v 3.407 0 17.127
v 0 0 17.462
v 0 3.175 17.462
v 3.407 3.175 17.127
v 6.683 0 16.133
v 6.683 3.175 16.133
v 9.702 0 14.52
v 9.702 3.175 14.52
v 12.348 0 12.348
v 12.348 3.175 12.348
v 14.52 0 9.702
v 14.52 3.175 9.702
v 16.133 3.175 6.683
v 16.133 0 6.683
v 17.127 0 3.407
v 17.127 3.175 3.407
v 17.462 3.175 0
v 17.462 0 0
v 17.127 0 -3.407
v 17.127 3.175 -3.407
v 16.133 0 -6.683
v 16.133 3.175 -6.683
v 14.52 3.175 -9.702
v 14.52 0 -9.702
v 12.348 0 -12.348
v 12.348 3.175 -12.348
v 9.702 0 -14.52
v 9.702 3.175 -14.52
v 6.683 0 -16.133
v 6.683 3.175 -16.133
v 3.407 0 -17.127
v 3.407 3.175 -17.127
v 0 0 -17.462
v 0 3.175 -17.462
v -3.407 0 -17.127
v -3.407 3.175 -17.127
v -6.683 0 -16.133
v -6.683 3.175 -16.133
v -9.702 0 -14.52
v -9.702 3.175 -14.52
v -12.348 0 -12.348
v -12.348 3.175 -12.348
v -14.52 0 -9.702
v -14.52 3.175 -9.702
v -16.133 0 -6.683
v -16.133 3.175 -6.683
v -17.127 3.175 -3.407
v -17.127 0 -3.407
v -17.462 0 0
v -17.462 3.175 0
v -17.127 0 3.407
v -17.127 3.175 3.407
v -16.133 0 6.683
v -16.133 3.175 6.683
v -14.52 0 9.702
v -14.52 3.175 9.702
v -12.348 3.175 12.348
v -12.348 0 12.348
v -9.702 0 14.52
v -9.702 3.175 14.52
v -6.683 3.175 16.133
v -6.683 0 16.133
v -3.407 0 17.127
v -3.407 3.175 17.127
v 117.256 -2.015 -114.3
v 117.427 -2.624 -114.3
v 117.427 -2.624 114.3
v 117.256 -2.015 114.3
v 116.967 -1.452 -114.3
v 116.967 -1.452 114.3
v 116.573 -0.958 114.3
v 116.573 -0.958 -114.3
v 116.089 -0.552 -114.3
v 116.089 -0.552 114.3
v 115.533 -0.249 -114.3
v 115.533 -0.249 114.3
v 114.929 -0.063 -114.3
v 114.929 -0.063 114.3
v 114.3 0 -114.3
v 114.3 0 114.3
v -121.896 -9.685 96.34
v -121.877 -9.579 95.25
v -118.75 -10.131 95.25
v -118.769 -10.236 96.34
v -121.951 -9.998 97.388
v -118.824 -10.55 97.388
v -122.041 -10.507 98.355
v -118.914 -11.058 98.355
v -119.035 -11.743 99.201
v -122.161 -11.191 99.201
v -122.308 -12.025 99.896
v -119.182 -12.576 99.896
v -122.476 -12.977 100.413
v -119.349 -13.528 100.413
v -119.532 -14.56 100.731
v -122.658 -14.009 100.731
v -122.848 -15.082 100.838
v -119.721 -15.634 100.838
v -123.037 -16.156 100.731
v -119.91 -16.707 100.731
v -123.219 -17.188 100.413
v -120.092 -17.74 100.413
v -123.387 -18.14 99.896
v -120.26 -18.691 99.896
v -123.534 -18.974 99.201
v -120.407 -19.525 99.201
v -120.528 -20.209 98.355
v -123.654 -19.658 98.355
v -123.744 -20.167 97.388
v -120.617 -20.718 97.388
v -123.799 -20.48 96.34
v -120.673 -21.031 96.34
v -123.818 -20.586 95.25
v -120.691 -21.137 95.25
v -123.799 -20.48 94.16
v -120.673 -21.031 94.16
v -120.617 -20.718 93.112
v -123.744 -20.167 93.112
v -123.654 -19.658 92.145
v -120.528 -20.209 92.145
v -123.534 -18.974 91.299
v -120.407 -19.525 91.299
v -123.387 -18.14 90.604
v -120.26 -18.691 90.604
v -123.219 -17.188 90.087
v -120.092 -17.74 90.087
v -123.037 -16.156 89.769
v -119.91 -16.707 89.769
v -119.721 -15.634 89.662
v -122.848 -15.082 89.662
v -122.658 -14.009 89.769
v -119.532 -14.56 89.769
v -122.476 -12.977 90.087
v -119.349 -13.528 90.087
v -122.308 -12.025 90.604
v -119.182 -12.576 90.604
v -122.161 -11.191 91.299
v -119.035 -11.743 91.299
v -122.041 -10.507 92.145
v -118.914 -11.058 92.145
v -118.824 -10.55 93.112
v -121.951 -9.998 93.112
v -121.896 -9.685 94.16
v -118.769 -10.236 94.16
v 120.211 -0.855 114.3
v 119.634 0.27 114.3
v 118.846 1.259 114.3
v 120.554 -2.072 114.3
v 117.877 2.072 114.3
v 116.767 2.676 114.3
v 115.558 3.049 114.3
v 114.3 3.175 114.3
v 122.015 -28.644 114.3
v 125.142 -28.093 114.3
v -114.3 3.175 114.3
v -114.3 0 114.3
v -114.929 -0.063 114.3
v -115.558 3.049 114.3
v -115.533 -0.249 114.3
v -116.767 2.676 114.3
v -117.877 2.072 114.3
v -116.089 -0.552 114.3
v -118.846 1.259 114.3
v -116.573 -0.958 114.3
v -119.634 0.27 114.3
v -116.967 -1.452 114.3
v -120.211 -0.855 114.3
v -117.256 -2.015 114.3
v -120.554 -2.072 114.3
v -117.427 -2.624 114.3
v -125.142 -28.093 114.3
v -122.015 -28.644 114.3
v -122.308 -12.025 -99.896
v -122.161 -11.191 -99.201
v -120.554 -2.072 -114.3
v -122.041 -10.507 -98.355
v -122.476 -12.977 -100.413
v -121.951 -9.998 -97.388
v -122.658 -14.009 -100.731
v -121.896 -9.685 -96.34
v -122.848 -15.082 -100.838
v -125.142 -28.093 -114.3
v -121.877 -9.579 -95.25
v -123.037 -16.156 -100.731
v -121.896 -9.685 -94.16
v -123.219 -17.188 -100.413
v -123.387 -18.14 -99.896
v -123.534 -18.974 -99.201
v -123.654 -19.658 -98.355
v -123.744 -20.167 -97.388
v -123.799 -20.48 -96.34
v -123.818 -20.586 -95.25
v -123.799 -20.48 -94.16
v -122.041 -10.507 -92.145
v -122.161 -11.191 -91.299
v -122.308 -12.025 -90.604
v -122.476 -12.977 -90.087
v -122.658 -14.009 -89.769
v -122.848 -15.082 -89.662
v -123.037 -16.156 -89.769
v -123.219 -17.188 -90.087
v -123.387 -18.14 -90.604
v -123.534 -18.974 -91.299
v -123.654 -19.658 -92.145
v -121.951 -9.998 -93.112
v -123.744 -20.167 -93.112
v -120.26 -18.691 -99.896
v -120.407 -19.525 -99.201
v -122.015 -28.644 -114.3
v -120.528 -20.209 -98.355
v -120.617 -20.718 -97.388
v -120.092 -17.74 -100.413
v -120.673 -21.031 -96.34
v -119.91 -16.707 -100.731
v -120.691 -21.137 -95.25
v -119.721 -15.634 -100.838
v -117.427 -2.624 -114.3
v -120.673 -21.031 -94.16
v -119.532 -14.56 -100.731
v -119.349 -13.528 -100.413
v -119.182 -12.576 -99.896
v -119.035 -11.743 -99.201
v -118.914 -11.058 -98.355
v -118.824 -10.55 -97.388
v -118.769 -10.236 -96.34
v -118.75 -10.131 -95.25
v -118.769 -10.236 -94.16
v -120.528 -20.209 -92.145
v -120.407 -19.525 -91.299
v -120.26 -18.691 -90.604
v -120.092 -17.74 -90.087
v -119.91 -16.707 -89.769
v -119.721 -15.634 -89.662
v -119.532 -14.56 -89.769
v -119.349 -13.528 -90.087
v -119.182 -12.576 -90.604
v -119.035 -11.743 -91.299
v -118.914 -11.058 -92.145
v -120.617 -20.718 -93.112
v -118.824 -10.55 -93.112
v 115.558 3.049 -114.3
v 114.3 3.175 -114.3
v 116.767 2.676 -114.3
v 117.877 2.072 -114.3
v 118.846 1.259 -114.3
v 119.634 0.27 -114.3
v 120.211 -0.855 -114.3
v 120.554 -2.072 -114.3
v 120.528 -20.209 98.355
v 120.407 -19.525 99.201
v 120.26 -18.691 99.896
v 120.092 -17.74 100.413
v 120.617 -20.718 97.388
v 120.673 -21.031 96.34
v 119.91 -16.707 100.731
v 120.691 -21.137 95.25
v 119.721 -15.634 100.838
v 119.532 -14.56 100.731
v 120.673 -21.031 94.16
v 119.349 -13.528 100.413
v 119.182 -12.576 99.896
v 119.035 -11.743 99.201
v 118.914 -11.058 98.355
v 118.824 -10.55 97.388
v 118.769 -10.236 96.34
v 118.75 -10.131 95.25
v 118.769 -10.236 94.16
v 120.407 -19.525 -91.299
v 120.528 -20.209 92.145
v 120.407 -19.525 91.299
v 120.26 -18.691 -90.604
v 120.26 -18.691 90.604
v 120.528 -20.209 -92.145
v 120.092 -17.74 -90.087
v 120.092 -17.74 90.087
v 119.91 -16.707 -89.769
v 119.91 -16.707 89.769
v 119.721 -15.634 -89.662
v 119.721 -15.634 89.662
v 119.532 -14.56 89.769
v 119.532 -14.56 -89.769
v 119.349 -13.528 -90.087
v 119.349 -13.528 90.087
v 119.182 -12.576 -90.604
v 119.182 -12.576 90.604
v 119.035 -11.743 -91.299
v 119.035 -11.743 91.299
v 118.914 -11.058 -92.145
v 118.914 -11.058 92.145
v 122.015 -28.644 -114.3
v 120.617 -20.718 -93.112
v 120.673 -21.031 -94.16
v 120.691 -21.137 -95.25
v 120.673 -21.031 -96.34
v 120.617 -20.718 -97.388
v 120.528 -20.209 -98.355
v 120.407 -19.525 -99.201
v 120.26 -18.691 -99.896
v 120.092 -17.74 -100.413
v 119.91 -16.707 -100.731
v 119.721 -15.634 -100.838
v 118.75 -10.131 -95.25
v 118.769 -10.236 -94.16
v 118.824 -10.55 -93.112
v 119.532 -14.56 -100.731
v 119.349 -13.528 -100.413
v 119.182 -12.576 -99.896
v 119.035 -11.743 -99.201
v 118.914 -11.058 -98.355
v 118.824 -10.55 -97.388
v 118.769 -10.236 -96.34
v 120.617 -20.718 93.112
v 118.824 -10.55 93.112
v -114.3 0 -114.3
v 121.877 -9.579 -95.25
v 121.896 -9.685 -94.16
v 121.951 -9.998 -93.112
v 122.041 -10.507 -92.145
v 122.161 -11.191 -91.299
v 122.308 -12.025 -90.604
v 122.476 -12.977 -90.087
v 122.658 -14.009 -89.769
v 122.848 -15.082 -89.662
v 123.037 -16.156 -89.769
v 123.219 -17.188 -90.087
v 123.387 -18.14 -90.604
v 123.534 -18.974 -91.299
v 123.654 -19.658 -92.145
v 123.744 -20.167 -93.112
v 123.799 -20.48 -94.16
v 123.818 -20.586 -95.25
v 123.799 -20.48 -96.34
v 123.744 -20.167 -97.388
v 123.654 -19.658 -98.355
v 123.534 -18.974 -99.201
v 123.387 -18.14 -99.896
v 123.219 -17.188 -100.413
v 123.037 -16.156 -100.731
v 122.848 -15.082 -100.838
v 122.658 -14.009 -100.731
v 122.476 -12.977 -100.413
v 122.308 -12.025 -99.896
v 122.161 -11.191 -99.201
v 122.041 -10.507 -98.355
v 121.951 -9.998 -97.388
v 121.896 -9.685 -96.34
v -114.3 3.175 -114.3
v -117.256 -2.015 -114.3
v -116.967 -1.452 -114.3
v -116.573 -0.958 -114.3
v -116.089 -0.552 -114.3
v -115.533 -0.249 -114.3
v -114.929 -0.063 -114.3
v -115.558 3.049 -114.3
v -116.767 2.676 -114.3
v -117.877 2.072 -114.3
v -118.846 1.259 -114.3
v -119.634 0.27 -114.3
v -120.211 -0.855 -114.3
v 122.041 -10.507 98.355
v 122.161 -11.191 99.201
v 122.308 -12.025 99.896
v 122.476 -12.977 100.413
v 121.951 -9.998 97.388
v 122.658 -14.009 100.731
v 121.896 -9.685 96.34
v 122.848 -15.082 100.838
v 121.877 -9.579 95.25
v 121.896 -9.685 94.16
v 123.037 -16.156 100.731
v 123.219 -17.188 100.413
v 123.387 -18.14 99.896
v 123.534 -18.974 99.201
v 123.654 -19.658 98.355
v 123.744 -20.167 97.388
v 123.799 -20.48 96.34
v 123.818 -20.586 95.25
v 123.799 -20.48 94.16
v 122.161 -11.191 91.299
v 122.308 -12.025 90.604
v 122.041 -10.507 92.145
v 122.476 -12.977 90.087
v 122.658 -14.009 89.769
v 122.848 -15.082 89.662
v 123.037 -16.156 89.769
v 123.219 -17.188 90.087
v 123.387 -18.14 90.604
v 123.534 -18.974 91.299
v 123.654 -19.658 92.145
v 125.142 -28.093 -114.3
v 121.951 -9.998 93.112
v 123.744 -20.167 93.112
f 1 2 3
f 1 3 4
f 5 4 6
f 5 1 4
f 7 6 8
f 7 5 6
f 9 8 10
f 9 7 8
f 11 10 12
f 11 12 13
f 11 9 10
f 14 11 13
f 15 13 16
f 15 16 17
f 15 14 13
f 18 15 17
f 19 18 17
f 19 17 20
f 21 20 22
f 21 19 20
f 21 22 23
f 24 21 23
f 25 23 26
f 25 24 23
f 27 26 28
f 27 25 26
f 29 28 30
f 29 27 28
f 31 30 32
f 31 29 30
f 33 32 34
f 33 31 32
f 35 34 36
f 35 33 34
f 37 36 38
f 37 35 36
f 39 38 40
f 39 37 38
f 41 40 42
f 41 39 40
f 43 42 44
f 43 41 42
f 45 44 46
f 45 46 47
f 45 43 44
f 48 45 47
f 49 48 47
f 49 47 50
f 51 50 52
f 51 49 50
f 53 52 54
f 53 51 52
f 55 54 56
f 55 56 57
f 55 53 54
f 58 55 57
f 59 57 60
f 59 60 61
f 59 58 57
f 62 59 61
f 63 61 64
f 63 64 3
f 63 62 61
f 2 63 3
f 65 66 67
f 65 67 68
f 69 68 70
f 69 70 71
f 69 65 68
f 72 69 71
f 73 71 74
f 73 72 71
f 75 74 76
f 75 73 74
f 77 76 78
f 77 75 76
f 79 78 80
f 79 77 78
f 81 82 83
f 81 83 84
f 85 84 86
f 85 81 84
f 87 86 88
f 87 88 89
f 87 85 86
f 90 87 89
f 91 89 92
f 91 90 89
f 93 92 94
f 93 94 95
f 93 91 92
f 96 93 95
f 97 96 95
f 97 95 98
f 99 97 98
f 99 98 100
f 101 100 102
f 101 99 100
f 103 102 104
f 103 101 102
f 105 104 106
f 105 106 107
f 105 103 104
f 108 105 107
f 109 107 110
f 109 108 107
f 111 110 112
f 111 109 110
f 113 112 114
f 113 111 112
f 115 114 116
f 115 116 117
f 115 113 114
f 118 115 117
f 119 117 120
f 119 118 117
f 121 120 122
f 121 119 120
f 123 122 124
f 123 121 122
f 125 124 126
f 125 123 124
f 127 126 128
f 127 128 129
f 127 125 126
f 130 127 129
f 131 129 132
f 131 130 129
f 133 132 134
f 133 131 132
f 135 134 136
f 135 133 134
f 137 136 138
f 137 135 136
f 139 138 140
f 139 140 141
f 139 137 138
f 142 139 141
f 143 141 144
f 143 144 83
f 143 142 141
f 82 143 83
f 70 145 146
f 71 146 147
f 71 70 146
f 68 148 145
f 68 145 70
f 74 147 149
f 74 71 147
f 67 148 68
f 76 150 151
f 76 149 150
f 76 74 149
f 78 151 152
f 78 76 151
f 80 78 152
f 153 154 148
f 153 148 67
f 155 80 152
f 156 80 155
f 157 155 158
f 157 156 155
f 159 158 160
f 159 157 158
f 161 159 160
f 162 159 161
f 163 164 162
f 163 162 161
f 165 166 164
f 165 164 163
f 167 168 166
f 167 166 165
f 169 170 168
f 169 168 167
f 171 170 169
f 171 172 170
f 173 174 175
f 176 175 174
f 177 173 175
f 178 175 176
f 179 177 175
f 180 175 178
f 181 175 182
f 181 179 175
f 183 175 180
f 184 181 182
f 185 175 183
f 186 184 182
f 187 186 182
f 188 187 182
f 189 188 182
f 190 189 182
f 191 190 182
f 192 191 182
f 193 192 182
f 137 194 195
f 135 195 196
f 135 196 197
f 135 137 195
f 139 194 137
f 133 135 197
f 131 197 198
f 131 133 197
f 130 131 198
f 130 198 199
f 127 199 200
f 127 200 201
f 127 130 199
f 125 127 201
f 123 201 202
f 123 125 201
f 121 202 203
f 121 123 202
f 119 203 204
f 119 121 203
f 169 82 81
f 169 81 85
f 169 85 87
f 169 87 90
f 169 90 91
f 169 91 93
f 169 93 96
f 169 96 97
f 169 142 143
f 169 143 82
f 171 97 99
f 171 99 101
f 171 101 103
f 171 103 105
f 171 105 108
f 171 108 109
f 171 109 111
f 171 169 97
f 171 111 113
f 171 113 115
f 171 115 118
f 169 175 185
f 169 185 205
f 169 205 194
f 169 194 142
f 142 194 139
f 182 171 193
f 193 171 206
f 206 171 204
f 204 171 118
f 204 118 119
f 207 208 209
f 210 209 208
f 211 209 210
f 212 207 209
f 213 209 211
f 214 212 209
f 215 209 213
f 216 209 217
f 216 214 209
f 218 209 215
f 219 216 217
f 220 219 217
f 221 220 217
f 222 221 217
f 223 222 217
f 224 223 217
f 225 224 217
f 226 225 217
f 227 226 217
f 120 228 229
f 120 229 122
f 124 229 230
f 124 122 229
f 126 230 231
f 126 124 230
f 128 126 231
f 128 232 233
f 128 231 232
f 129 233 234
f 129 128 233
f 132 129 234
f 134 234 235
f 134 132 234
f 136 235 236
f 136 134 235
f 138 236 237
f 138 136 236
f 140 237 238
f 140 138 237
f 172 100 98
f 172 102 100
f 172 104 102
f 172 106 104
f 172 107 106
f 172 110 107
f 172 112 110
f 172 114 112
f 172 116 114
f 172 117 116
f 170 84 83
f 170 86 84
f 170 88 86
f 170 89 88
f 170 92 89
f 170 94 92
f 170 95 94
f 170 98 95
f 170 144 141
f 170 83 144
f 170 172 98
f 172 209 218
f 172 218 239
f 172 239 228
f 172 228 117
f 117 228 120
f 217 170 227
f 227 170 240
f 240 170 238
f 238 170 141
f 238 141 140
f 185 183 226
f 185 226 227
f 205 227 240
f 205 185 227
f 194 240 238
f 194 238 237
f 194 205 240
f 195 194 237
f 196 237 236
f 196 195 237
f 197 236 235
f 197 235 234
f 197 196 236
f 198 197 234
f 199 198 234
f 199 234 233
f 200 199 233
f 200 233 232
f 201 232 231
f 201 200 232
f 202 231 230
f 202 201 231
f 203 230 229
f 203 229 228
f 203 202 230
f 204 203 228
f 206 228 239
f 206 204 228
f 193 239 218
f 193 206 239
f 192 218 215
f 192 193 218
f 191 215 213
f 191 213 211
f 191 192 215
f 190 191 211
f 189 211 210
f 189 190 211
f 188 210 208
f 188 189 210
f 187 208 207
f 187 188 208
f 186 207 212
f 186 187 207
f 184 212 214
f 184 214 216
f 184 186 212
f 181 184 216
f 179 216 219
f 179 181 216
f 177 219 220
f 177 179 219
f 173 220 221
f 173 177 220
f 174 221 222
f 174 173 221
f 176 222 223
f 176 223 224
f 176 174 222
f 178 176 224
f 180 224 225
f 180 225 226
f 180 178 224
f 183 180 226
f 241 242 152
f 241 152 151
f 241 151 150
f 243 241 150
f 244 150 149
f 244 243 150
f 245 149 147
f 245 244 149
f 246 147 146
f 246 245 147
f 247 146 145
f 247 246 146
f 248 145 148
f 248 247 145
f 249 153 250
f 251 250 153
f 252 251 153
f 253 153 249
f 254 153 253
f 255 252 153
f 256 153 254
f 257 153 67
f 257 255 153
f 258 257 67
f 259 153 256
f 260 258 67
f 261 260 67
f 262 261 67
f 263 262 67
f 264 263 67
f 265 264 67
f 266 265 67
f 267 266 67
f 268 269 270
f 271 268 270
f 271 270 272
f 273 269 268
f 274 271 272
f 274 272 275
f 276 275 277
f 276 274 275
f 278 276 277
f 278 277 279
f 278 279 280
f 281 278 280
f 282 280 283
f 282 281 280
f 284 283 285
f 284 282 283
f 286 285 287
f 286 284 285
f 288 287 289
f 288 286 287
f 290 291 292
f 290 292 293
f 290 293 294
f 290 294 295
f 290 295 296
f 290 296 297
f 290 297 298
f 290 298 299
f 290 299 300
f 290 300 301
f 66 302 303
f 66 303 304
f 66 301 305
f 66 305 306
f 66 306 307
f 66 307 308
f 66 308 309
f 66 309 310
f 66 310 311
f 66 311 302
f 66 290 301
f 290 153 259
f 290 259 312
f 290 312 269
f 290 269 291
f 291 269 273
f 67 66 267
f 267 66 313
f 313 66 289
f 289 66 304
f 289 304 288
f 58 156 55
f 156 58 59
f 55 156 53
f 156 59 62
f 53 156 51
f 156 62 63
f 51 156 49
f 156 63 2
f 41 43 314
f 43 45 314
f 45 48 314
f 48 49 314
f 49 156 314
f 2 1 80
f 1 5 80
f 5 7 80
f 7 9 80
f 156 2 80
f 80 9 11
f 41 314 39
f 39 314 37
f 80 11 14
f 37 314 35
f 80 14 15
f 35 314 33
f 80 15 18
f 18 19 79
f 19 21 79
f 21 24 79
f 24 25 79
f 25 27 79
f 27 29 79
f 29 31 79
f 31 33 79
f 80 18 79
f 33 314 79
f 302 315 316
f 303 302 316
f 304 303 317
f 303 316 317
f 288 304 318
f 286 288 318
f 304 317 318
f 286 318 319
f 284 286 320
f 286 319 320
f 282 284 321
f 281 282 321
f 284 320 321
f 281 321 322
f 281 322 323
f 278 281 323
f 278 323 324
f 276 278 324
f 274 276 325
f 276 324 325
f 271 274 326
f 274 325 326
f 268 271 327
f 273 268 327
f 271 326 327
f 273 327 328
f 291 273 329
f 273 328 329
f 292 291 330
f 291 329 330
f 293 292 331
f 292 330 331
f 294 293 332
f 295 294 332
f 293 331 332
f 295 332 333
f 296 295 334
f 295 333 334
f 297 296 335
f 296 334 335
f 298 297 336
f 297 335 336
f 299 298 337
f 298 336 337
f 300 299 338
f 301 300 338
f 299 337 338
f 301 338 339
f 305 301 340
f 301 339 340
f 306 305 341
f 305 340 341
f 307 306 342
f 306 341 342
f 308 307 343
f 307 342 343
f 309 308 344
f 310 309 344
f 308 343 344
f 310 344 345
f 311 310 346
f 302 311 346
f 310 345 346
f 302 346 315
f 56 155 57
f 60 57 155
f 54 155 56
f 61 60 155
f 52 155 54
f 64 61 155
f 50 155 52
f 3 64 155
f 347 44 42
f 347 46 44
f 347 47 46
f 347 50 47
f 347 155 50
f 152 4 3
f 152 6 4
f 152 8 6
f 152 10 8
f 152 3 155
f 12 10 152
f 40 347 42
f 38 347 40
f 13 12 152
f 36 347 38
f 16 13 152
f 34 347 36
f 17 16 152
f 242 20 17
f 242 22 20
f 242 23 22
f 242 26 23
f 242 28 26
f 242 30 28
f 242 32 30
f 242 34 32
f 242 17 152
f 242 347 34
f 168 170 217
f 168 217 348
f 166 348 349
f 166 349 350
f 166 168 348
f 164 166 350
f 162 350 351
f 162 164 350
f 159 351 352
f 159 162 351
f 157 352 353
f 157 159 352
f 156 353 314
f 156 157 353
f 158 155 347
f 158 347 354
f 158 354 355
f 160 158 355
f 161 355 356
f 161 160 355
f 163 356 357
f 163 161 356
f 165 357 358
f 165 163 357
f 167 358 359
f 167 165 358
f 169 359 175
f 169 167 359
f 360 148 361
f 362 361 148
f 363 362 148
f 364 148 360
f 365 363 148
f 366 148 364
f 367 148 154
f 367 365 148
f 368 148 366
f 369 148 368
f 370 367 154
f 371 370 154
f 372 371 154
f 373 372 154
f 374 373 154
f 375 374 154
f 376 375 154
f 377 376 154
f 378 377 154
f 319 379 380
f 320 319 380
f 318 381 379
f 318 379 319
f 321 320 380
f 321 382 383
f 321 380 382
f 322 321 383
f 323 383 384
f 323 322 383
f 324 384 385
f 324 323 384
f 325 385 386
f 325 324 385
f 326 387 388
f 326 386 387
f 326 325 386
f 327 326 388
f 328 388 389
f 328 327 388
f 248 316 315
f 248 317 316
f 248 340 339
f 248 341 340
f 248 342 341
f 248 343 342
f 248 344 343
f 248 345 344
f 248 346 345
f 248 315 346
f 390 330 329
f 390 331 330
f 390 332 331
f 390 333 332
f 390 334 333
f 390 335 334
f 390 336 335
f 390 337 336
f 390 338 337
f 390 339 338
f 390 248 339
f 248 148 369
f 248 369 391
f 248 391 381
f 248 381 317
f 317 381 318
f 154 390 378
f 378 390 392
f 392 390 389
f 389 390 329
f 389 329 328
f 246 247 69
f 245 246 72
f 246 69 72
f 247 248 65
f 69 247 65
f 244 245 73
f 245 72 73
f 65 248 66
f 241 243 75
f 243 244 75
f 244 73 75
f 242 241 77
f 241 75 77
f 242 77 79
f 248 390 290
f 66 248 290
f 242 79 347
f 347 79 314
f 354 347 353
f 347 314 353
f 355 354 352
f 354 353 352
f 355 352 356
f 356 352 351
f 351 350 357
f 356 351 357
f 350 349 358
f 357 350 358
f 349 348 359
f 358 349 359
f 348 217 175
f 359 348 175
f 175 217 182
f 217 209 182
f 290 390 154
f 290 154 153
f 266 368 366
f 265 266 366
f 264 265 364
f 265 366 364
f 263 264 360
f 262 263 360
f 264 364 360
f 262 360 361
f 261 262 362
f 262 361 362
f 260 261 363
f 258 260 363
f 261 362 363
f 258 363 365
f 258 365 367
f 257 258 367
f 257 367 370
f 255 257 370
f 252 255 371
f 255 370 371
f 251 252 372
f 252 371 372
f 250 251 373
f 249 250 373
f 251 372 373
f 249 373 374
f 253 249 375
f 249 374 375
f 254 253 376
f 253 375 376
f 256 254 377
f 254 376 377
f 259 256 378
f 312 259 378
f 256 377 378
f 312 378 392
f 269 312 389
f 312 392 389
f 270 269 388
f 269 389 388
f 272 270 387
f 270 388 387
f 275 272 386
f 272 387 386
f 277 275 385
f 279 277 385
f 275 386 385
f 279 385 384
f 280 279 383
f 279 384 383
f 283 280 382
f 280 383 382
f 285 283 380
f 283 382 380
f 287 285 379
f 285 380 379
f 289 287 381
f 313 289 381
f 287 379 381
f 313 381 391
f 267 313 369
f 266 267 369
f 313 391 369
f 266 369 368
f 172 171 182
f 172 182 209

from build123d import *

# Parameters (mm, degrees)
SKETCH5_W               = 228.6
SKETCH5_H               = 228.6
SKETCH5_R               = 17.4625
BOSS_EXTRUDE3_DEPTH     = 3.175
EDGE_FLANGE1_DEPTH      = 228.6
EDGE_FLANGE1_BEND_DEPTH = 228.6
SKETCH17_R              = 5.588
CUT_EXTRUDE1_DEPTH      = 3.175


# Sheet-metal steps are written as plain solids
with BuildPart() as part:
    # Sketch5 → Boss-Extrude3 (new body)
    with BuildSketch(Plane(origin=(0, 0, 0), x_dir=(1, 0, 0), z_dir=(0, 1, 0))):
        Rectangle(SKETCH5_W, SKETCH5_H)
        with Locations(Location((0, 0, 0), (0, 0, 270))):
            Circle(SKETCH5_R, mode=Mode.SUBTRACT)
    extrude(amount=BOSS_EXTRUDE3_DEPTH)

    # Edge-Flange1 section (across the edge) → Edge-Flange1 (add)
    with BuildSketch(Plane(origin=(116.964141329, 0, -114.3), x_dir=(-0.9848077530122075, -0.17364817766693427, 0), z_dir=(0, 0, 1))):
        with BuildLine():
            Line((-3.175, 2.664141329), (-3.175, 29.085858671))
            Line((-3.175, 29.085858671), (0, 29.085858671))
            Line((0, 29.085858671), (0, 2.664141329))
            ThreePointArc((0, 2.664141329), (0.742808893, 0.623290668), (2.623667036, -0.462623287))
            Line((2.623667036, -0.462623287), (2.072334072, -3.589387903))
            ThreePointArc((2.072334072, -3.589387903), (-1.689382214, -1.417559993), (-3.175, 2.664141329))
        make_face()
    extrude(amount=EDGE_FLANGE1_DEPTH)

    # Edge-Flange1 section 2 (across the edge) → Edge-Flange1 bend (add)
    with BuildSketch(Plane(origin=(-116.964141329, 0, 114.3), x_dir=(0.9848077530122075, -0.17364817766693427, 0), z_dir=(0, 0, -1))):
        with BuildLine():
            Line((-3.175, 2.664141329), (-3.175, 29.085858671))
            Line((-3.175, 29.085858671), (0, 29.085858671))
            Line((0, 29.085858671), (0, 2.664141329))
            ThreePointArc((0, 2.664141329), (0.742808893, 0.623290668), (2.623667036, -0.462623287))
            Line((2.623667036, -0.462623287), (2.072334072, -3.589387903))
            ThreePointArc((2.072334072, -3.589387903), (-1.689382214, -1.417559993), (-3.175, 2.664141329))
        make_face()
    extrude(amount=EDGE_FLANGE1_BEND_DEPTH)

    # Sketch17 → Cut-Extrude1 (cut)
    with BuildSketch(Plane(origin=(116.564005532, 20.553379155, 0), x_dir=(0, 0, -1), z_dir=(0.9848077530122075, 0.17364817766693408, 0))):
        with Locations(Location((-95.25, -36.185609994, 0), (0, 0, 90))):
            Circle(SKETCH17_R)
        with Locations(Location((95.25, -36.185609994, 0), (0, 0, 90))):
            Circle(SKETCH17_R)
    cut_extrude1 = extrude(amount=-CUT_EXTRUDE1_DEPTH, mode=Mode.SUBTRACT)

    # Mirror1: Cut-Extrude1 across plane
    add(cut_extrude1.mirror(Plane(origin=(0, 0, 0), x_dir=(0, 0, 1), z_dir=(1, 0, 0))), mode=Mode.SUBTRACT)


solid = part.part
